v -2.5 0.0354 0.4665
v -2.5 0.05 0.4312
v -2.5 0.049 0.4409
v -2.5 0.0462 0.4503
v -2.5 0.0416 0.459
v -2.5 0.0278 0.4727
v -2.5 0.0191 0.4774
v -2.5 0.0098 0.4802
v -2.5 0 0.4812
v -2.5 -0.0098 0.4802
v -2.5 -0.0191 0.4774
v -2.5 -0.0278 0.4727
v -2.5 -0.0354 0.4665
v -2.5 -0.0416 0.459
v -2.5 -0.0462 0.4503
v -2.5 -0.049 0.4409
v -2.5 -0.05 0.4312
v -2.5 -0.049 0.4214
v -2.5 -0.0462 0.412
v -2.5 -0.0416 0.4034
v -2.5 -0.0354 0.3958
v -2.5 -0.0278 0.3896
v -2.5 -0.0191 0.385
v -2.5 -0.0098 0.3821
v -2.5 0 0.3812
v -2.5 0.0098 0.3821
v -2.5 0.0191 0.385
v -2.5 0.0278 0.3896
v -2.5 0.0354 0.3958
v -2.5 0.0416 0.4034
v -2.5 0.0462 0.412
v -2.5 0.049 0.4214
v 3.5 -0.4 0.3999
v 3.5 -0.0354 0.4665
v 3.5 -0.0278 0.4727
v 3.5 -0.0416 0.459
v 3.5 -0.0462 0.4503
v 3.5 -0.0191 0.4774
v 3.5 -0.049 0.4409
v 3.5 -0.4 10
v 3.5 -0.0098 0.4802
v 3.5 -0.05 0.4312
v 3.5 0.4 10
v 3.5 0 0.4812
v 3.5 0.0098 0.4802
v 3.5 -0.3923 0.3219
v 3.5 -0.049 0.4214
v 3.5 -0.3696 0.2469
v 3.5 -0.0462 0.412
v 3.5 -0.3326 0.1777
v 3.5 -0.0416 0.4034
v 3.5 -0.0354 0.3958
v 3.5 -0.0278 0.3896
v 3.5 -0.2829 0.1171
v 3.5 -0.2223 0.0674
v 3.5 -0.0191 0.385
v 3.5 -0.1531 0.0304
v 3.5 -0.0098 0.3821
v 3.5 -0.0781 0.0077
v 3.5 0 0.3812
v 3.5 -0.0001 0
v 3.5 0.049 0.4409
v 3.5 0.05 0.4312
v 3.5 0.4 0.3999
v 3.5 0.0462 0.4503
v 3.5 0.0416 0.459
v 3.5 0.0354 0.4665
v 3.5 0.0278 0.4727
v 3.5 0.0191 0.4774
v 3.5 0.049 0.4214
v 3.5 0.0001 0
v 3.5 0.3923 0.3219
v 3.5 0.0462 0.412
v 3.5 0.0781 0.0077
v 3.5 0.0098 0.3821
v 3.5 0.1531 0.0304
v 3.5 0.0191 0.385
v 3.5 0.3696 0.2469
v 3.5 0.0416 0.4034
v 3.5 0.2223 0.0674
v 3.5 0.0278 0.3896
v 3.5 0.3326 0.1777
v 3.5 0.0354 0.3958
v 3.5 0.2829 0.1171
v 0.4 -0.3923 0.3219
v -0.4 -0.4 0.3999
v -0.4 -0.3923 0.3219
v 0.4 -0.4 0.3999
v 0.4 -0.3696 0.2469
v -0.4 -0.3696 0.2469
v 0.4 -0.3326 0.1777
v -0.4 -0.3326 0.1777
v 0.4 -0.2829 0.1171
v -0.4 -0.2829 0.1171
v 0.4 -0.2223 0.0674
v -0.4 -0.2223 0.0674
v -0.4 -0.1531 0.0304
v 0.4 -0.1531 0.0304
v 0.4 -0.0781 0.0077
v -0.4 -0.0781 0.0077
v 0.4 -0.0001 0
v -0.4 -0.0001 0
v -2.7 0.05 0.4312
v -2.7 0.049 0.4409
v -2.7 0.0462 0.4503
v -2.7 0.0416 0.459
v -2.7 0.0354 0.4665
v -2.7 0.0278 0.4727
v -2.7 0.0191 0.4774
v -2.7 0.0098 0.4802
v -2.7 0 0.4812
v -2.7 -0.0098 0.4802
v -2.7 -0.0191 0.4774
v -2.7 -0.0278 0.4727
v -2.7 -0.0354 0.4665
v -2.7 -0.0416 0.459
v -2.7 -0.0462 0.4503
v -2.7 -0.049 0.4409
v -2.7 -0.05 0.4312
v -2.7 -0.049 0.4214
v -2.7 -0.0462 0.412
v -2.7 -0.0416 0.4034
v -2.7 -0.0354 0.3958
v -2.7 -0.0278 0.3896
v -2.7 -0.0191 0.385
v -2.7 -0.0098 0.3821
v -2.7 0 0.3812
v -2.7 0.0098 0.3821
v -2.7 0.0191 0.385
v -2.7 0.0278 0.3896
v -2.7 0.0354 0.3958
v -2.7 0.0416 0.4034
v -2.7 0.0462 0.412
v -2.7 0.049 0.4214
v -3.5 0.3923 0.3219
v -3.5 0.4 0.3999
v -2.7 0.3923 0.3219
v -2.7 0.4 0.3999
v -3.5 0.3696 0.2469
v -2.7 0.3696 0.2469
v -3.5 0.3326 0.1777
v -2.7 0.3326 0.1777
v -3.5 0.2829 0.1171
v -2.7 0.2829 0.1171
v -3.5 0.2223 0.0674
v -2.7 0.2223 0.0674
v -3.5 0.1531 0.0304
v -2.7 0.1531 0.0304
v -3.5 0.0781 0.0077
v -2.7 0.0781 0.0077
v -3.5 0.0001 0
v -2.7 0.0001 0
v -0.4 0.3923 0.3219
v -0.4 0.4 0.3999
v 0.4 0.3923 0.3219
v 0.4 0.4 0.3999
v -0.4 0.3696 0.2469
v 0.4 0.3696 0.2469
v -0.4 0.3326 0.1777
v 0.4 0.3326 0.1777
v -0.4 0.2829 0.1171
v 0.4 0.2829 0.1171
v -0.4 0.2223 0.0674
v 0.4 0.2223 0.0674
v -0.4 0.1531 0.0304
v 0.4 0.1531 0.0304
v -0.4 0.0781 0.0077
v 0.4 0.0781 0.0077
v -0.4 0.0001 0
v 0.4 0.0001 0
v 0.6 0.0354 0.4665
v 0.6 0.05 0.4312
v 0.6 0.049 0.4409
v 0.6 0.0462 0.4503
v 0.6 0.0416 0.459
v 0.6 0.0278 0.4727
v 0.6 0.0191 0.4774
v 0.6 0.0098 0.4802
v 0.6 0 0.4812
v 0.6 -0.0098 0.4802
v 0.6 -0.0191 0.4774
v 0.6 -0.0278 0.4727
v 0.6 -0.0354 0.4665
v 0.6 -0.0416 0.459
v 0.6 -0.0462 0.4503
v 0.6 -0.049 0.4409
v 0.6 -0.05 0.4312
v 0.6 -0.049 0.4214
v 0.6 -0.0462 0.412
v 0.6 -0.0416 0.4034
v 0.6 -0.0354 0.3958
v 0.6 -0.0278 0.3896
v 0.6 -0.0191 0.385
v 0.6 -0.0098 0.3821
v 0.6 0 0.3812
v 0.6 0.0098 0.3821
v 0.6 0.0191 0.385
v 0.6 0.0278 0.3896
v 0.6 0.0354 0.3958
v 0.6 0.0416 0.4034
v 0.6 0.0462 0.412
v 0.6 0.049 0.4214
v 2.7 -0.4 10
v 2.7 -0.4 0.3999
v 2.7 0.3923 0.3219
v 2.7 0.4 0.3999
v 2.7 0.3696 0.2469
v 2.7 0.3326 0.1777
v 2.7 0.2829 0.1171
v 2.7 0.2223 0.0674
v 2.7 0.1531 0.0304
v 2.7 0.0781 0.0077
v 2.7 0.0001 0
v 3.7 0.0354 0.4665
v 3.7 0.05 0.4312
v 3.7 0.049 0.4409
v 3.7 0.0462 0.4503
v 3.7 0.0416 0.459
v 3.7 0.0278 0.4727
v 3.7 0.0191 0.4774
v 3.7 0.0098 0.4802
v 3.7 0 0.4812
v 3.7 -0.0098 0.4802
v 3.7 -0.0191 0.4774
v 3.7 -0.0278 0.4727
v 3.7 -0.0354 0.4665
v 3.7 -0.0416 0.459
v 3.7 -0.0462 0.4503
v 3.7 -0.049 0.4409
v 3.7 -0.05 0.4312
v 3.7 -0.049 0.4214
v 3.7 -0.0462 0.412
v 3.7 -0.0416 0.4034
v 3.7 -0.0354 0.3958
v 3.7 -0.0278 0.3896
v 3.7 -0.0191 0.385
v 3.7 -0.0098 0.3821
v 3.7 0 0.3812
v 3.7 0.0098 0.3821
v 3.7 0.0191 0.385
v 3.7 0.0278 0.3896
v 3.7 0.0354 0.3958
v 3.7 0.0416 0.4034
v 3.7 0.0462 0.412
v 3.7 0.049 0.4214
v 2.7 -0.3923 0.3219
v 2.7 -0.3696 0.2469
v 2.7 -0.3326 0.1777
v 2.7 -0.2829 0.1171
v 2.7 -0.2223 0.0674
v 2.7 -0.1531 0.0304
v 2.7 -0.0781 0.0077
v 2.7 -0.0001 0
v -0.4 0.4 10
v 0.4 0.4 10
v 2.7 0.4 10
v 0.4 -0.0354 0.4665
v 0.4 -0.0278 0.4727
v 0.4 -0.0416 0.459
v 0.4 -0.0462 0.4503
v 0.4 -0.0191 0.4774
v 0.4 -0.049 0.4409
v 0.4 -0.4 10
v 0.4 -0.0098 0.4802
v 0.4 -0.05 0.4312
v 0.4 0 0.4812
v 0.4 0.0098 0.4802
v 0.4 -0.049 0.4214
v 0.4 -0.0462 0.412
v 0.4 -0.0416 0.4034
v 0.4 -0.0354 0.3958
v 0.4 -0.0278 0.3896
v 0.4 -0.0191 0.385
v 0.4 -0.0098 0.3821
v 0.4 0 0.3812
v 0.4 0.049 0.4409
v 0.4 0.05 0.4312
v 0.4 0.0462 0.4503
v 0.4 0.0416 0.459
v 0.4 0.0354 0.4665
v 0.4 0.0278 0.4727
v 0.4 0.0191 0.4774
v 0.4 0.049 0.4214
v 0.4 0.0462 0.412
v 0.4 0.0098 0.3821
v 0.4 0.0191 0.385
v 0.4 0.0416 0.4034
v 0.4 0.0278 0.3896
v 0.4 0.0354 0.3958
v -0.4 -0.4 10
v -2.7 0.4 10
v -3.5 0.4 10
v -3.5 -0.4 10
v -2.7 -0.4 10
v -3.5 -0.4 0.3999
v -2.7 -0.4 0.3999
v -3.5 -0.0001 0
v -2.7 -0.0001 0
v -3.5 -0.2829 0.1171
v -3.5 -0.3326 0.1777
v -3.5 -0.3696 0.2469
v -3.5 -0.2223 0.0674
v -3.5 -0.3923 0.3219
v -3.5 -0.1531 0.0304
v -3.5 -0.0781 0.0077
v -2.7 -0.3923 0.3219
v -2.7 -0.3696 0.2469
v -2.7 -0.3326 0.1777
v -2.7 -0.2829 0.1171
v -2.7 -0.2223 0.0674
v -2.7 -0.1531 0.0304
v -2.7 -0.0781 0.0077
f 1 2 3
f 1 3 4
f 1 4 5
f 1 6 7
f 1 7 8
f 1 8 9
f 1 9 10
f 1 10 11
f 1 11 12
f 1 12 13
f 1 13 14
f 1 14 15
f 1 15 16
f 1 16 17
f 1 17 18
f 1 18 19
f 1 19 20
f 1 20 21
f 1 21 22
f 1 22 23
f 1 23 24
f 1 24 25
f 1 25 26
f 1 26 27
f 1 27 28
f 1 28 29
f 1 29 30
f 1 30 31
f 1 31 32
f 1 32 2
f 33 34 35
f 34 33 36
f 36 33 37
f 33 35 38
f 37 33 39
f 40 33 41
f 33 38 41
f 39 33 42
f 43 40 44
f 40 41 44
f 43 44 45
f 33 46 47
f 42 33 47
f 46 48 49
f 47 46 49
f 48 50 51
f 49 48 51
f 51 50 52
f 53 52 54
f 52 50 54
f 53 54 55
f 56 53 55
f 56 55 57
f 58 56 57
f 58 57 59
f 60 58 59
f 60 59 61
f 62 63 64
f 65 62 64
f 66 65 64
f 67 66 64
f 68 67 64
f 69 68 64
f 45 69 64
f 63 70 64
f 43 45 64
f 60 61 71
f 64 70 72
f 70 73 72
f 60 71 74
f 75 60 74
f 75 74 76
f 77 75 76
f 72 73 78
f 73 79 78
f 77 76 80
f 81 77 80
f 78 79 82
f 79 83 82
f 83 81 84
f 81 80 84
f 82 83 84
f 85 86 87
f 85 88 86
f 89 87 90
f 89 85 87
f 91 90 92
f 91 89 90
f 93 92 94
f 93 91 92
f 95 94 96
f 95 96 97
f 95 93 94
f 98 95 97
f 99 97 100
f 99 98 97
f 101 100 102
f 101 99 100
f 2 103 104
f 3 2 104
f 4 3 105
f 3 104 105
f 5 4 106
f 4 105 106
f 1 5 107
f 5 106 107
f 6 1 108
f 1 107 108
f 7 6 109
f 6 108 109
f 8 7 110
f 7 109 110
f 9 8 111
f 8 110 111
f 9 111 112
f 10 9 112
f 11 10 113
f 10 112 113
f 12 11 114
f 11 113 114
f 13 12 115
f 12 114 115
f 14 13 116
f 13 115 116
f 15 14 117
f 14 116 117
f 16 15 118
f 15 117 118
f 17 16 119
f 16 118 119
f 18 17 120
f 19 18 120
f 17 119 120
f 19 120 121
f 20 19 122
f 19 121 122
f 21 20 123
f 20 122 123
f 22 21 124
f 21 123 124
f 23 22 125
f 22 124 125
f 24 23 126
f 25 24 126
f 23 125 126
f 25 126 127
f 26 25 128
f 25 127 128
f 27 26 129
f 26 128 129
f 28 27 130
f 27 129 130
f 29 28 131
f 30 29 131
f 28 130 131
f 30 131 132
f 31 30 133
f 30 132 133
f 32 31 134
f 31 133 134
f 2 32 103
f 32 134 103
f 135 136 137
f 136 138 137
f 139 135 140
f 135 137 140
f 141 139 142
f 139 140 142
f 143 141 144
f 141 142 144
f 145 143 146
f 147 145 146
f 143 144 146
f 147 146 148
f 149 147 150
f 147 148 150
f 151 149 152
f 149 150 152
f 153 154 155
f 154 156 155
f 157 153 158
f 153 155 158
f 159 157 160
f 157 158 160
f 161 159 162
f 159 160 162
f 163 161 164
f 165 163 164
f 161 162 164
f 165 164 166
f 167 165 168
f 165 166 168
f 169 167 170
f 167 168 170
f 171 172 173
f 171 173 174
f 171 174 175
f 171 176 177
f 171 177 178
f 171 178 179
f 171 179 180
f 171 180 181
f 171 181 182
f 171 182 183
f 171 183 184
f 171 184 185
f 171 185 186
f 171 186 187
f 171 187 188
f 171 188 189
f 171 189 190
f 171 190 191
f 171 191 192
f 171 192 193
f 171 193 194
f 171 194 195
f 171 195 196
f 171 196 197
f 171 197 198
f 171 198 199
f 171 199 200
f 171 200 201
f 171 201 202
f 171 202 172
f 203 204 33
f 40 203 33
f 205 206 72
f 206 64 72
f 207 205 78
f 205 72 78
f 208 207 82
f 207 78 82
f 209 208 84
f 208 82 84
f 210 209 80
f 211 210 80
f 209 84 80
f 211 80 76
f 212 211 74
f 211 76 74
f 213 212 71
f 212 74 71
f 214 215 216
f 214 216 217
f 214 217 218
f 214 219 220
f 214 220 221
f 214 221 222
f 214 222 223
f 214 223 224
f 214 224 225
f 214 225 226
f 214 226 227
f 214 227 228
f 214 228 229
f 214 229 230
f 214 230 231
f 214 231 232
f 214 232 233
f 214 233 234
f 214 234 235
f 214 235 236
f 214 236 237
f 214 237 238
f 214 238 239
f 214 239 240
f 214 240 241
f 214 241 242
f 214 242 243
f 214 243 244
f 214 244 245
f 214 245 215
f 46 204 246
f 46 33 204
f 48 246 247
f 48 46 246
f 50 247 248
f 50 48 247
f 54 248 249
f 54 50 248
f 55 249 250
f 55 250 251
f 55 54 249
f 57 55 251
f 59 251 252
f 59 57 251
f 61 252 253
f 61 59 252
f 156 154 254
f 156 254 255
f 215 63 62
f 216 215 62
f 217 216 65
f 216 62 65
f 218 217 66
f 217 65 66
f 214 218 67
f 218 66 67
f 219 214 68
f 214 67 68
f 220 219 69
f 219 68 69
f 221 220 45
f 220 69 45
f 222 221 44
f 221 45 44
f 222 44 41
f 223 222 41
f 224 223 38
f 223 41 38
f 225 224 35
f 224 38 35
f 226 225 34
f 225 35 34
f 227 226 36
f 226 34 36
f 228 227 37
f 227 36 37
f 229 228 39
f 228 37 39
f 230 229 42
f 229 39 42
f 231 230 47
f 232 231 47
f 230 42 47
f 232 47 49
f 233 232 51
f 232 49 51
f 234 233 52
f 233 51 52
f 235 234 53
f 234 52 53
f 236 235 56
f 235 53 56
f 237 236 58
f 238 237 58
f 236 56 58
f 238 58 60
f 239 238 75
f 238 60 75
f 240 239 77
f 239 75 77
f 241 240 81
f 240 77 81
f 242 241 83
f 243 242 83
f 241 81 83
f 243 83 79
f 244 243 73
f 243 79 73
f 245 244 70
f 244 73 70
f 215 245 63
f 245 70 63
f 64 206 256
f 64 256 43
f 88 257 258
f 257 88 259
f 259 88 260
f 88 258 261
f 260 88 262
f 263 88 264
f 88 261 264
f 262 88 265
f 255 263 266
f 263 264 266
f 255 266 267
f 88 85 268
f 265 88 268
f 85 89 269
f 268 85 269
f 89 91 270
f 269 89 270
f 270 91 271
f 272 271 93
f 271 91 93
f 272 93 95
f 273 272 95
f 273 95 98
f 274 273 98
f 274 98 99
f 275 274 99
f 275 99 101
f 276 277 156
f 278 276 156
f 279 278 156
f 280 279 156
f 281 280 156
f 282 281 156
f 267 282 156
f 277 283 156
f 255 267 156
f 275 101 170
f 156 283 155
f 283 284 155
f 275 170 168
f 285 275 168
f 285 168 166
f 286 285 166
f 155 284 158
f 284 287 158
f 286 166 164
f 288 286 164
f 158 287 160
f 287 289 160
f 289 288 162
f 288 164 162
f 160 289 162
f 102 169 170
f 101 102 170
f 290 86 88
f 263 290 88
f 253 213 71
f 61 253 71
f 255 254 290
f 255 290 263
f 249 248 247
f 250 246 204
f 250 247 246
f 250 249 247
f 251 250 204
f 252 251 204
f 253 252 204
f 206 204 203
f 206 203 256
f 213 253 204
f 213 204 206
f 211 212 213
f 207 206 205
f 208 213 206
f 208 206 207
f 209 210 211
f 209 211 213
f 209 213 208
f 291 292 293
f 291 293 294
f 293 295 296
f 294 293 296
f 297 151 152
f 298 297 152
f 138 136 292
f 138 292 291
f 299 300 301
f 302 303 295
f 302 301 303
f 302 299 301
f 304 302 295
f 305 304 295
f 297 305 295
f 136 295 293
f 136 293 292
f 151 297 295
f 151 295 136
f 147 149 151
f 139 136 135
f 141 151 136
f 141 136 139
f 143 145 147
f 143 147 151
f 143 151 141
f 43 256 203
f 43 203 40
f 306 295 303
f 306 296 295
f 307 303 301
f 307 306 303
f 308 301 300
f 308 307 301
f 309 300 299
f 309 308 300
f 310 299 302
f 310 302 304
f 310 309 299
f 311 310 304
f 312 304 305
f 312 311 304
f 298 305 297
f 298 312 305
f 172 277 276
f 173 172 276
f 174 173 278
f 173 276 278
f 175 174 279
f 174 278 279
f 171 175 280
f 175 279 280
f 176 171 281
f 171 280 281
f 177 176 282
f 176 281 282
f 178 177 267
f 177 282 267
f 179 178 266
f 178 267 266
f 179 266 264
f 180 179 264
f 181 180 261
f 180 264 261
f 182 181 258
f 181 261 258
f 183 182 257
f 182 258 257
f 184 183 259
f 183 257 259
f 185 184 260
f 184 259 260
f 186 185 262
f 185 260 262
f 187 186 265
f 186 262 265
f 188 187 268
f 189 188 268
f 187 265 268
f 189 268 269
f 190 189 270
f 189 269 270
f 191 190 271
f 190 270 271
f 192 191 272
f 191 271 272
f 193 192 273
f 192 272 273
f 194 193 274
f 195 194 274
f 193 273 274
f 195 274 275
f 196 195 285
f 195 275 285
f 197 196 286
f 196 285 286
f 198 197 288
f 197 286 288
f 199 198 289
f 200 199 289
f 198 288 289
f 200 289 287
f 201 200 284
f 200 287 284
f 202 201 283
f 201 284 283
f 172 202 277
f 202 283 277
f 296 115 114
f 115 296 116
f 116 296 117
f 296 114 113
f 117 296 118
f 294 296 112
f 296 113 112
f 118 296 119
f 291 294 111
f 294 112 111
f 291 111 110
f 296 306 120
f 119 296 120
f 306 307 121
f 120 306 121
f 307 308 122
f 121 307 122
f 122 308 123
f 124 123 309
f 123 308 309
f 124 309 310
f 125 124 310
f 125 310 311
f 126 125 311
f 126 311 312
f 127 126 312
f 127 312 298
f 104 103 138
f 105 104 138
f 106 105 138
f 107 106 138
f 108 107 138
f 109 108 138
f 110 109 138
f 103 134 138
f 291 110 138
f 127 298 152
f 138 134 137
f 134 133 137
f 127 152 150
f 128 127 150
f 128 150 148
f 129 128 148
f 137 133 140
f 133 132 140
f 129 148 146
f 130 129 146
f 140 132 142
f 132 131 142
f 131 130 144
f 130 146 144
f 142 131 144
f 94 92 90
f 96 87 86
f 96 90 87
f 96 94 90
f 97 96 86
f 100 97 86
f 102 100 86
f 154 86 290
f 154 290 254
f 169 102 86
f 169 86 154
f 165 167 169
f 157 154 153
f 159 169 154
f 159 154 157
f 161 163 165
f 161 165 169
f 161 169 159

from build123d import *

# Parameters (mm, degrees)
SKETCH2_W           = 0.8
SKETCH2_H           = 0.8
BOSS_EXTRUDE1_DEPTH = 10
SKETCH3_R           = 0.05
BOSS_EXTRUDE2_DEPTH = 0.2
FILLET1_R           = 0.4
LPATTERN1_COUNT     = 2
LPATTERN1_PITCH     = 3.1
LPATTERN1_2_COUNT   = 2
LPATTERN1_2_PITCH   = 3.1


with BuildPart() as part:
    # Sketch2 → Boss-Extrude1 (new body)
    with BuildSketch(Plane.XY):
        Rectangle(SKETCH2_W, SKETCH2_H)
    extrude(amount=BOSS_EXTRUDE1_DEPTH)

    # Sketch3 → Boss-Extrude2 (add)
    with BuildSketch(Plane(origin=(0.4, 0, 0), x_dir=(0, 0, -1), z_dir=(1, 0, 0))):
        with Locations(Location((-0.431172897, 0, 0), (0, 0, 90))):
            Circle(SKETCH3_R)
    extrude(amount=BOSS_EXTRUDE2_DEPTH)

    # Fillet1
    fillet1_edges = [part.edges().sort_by_distance(p)[0] for p in [
        (0, -0.4, 0),
        (0, 0.4, 0),
    ]]
    fillet(fillet1_edges, radius=FILLET1_R - 0.0001)  # a hair under: the kernel refuses the full size


with BuildPart() as lpattern1_1:
    # LPattern1: pattern copy
    add(part.part.moved(Location(Vector(1, 0, 0) * (1 * LPATTERN1_PITCH))))


with BuildPart() as lpattern1_2_1:
    # LPattern1 2: pattern copy
    add(part.part.moved(Location(Vector(-1, 0, 0) * (1 * LPATTERN1_2_PITCH))))


solid = Compound([part.part, lpattern1_1.part, lpattern1_2_1.part])
